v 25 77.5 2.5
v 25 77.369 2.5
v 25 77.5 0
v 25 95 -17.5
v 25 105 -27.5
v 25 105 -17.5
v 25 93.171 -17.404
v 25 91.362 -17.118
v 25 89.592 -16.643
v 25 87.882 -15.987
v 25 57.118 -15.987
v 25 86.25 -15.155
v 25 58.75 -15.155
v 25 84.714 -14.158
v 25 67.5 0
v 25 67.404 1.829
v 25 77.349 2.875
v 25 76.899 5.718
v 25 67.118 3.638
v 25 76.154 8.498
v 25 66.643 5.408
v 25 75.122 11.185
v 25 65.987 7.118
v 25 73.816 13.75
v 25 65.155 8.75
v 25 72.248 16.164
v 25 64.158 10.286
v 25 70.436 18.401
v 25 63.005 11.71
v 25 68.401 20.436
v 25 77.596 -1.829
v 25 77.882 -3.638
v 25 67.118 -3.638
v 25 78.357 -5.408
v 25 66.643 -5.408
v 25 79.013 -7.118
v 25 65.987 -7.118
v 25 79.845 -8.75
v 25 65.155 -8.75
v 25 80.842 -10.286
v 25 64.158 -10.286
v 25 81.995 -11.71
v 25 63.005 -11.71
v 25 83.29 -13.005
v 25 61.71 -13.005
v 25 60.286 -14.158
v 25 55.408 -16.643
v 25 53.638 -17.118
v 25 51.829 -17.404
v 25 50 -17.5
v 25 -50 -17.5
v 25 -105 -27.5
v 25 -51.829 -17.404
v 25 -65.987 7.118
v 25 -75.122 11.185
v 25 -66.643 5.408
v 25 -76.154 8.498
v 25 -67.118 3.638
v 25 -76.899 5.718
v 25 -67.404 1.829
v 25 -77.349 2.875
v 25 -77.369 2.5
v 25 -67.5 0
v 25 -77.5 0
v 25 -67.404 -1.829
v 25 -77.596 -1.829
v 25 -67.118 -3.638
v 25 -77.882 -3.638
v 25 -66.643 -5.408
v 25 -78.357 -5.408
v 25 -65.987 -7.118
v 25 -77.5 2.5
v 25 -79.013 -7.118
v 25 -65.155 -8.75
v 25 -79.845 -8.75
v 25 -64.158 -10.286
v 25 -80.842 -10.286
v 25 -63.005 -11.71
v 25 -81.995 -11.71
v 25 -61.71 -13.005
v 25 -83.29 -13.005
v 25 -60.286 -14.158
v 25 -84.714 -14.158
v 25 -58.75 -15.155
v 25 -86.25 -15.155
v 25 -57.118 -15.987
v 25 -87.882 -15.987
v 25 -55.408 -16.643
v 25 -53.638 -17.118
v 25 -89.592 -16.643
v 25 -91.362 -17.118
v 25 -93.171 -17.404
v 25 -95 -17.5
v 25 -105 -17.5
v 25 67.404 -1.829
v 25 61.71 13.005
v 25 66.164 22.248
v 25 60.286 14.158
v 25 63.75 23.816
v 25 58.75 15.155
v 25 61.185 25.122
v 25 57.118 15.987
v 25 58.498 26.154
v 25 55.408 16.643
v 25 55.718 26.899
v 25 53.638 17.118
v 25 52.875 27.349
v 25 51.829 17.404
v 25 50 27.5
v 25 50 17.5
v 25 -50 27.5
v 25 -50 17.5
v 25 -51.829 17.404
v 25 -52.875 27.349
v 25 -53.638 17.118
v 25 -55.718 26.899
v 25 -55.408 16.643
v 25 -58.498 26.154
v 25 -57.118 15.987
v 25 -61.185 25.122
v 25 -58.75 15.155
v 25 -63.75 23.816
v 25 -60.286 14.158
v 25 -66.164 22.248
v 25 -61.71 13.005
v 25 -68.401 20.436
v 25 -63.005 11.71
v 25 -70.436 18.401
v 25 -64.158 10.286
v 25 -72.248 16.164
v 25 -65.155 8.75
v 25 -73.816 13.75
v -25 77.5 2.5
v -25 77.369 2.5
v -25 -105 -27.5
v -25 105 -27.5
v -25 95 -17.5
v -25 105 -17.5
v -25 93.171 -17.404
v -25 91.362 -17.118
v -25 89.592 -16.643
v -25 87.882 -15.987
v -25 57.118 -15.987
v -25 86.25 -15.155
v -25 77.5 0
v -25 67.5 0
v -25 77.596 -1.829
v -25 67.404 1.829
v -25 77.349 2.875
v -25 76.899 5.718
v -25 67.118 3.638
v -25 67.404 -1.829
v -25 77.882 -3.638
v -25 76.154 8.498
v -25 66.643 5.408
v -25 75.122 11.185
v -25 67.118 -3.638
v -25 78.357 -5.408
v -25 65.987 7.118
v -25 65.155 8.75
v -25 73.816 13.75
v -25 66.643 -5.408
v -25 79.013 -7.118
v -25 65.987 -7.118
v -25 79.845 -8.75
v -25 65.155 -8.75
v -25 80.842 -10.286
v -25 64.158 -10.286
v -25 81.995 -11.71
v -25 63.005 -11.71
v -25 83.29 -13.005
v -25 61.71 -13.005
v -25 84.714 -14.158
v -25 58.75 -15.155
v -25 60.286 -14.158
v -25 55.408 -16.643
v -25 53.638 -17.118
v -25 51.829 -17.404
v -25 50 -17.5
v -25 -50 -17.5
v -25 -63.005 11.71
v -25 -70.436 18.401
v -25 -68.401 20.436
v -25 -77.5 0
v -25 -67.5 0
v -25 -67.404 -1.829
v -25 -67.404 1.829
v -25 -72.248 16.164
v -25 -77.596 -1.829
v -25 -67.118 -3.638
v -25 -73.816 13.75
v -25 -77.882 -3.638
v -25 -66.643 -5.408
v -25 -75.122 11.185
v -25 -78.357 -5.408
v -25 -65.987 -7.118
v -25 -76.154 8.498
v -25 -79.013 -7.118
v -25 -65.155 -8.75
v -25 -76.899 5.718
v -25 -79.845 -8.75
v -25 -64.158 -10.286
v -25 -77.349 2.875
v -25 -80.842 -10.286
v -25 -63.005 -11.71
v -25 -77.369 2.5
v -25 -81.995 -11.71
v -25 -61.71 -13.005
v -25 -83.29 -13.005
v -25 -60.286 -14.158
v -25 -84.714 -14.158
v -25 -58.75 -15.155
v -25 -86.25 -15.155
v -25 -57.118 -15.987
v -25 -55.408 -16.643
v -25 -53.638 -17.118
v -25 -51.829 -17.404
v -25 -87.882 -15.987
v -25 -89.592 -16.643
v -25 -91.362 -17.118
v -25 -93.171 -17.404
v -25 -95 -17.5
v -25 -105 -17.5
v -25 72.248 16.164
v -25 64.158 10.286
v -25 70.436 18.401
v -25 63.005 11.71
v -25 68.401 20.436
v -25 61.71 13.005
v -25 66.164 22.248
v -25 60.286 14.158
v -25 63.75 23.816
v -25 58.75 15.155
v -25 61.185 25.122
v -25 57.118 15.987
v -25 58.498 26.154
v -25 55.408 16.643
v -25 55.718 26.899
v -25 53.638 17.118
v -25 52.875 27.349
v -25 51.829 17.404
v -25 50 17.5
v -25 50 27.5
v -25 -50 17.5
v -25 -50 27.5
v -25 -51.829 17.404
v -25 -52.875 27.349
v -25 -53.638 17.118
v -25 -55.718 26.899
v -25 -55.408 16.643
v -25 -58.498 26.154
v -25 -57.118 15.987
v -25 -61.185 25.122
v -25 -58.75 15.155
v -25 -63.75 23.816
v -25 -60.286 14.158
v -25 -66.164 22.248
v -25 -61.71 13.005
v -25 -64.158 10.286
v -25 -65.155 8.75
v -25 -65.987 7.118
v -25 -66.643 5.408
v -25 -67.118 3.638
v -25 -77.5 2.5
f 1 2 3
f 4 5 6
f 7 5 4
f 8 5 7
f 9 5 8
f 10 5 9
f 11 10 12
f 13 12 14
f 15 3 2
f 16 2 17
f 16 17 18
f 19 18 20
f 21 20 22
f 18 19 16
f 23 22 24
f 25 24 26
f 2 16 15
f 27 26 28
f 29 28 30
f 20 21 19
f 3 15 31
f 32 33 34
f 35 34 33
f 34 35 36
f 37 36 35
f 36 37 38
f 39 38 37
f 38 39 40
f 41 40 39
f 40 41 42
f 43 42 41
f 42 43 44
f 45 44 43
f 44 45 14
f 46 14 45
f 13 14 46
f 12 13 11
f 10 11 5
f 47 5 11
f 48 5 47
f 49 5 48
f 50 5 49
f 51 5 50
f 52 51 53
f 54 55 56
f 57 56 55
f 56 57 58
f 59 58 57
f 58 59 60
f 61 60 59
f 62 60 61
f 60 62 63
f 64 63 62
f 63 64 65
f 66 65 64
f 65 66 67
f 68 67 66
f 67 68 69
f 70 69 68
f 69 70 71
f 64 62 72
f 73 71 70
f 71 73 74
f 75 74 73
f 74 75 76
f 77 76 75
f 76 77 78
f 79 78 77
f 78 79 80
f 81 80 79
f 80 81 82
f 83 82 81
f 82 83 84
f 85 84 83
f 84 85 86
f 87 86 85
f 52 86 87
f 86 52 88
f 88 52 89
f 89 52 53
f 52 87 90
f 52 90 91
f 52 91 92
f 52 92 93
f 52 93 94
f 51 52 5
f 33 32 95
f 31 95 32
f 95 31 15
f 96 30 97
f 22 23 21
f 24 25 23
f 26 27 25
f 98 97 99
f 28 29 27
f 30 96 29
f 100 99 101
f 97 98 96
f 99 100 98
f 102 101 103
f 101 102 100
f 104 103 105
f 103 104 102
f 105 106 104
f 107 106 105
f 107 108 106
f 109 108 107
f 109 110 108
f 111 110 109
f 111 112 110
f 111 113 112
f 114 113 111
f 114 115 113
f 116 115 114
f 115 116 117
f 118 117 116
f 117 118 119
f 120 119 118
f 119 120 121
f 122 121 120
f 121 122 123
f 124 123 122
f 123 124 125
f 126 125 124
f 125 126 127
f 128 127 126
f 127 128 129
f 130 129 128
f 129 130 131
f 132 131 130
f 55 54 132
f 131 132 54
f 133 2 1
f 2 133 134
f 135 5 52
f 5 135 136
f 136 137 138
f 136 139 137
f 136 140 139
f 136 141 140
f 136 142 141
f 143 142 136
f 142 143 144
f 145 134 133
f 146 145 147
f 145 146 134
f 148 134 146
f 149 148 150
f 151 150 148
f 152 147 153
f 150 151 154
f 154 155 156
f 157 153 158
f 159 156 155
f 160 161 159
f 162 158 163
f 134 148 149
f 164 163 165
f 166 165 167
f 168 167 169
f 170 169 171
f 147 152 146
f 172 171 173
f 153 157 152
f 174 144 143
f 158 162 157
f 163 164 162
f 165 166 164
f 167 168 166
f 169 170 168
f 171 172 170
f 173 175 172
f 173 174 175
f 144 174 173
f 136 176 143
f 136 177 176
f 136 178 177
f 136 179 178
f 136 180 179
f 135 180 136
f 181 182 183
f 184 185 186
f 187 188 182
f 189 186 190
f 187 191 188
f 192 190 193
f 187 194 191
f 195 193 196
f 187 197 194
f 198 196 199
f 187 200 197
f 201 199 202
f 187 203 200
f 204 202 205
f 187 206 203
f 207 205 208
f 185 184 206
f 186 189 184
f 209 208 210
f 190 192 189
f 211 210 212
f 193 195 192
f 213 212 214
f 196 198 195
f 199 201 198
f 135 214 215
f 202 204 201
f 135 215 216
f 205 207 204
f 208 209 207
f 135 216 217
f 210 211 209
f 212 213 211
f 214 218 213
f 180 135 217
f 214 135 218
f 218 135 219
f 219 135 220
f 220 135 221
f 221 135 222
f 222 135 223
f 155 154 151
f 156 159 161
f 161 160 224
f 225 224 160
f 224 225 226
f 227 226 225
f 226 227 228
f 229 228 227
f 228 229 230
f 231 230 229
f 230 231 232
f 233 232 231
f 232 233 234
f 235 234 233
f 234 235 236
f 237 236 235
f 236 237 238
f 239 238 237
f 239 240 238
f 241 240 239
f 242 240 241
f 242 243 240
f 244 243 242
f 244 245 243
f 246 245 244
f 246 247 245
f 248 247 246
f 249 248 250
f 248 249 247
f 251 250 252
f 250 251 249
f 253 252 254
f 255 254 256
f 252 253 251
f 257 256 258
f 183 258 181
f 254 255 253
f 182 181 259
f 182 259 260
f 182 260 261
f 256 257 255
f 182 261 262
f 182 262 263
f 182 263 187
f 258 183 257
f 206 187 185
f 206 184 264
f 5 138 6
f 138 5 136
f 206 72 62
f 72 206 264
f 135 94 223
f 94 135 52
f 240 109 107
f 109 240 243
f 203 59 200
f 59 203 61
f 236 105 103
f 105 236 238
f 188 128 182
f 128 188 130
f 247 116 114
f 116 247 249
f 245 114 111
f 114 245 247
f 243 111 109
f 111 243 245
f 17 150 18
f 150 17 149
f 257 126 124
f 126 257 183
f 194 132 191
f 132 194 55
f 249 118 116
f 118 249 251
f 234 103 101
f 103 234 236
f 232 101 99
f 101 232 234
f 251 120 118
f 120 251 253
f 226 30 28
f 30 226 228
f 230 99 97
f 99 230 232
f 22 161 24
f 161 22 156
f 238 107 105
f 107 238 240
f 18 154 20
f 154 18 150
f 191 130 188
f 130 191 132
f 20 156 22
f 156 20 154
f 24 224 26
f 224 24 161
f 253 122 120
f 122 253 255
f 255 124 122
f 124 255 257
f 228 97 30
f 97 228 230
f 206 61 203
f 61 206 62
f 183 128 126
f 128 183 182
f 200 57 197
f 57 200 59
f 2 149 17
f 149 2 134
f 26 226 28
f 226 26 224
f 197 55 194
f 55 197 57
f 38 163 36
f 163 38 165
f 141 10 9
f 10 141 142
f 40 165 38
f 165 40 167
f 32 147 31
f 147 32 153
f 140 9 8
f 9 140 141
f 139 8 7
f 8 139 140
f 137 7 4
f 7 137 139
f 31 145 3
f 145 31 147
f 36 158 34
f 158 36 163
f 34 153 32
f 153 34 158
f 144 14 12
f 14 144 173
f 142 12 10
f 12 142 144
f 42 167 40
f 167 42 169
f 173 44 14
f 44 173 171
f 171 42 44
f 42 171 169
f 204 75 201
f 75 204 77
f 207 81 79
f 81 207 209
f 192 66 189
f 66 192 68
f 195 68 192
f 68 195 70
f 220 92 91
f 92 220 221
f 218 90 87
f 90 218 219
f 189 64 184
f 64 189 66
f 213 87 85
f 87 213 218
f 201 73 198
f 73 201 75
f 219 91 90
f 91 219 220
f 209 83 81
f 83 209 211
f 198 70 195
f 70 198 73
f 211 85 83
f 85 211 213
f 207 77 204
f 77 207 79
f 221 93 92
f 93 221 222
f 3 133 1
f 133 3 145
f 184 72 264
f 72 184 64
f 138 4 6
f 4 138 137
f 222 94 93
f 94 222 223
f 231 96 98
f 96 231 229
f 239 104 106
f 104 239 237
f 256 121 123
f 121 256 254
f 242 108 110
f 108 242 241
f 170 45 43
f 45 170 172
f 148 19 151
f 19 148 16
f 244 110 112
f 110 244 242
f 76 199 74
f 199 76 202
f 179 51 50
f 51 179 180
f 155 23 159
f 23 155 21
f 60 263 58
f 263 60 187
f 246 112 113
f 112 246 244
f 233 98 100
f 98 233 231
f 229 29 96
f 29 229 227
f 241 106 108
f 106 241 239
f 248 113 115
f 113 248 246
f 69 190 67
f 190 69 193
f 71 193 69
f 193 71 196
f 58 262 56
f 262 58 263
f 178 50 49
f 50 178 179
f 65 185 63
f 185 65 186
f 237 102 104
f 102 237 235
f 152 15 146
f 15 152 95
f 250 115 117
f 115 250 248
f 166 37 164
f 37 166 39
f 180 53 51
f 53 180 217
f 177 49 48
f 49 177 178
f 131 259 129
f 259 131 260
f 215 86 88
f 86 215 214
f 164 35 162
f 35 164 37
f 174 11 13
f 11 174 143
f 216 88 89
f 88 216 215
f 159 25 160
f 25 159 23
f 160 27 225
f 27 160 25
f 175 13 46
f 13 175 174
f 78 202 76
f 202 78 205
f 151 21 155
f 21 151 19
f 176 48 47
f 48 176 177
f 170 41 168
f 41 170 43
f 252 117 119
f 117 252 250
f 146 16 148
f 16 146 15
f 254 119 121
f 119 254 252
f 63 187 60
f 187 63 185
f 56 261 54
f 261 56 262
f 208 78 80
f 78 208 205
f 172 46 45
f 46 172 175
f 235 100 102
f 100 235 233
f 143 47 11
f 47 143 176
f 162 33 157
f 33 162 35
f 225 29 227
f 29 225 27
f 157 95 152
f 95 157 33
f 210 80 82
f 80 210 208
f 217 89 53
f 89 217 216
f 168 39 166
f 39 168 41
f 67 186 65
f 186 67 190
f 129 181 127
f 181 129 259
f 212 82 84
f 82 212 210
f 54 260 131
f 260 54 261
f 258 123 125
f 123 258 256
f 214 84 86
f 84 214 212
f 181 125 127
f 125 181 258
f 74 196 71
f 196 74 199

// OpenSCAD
// file: Lib/fillet_cylinder.scad
module filleted_cylinder(
    cylinder_height=2,
    cylinder_radius=1,
    fillet_radius_bottom=1,
    fillet_radius_top=0,
    nfaces=50
) {
    /* created by Kevin Lam on Dec 3, 2016 */
    union() {      
        cylinder(cylinder_height, r=cylinder_radius, $fn=nfaces, false);
        
        if (fillet_radius_bottom > 0) {
            difference() {
                cylinder(fillet_radius_bottom, r=cylinder_radius+fillet_radius_bottom, $fn=nfaces, false);
                translate([0, 0, fillet_radius_bottom])
                rotate_extrude($fn=nfaces)
                translate([cylinder_radius+fillet_radius_bottom, 0, 0])
                circle(fillet_radius_bottom, $fn=nfaces);
            }
        }
        
        if (fillet_radius_top>0) {
            difference() {
                translate([0,0,cylinder_height-fillet_radius_top])
                cylinder(fillet_radius_top, r=cylinder_radius+fillet_radius_top, $fn=nfaces, false);
                
                translate([0, 0, cylinder_height-fillet_radius_top])
                rotate_extrude($fn=nfaces)
                translate([cylinder_radius+fillet_radius_top, 0, 0])
                circle(fillet_radius_top, $fn=nfaces);
            }
        }
    }
}
// file: Lib/prism.scad
   module prism(l, w, h){
   polyhedron(
           points=[[0,0,0], [l,0,0], [l,w,0], [0,w,0], [0,w,h], [l,w,h]],
           faces=[[0,1,2,3],[5,4,3,2],[0,4,5,1],[0,3,4],[5,2,1]]
           );

   }
   
// file: Lib/corner_radiuser.scad
module cornerRadiuser(radius=6){
    difference(){
        translate([radius/2,radius/2,0])
        cube([radius,radius,radius*2], center=true);
        cylinder(h=(radius*2)+2,r=radius, center=true);
    }
}
// file: Lib/steppers.scad
/**
 * Implementation of a model of a 28BYJ-48 type cheapo stepper motor
 */
use <mirrorcopy.scad>;
module stepper28BYJ48(){
    color("light grey"){
        translate([0,-8,0]){
            // Motor body
            translate([0,0,(19/2)*-1]){
                cylinder(d=28,h=19, center=true);
            }

            // Motor snooter
            translate([0,8,0]){
                translate([0,0,(1.5/2)])cylinder(d=9,h=1.5, center=true);
                difference(){
                    translate([0,0,(5/2)+2])cylinder(d=5,h=6, center=true);
                    mirrorCopy([0,1,0]){
                        translate([0,4,(5/2)+2.1])cube([5,5,6.2], center=true);
                    }
                }
            }
            
            // cable gland
            translate([0,(17/2)*-1,(19/2)*-1]){
                cube([14.8,17,19], center=true);
            }
            
            // Attachment crossbar
            difference(){
                hull(){
                    mirrorCopy([1,-0,0]){
                        translate([(35/2),0,(1/2)*-1]){
                            cylinder(h=1,d=7, center=true);
                        }
                    }
                }
                mirrorCopy([1,-0,0]){
                    translate([(35/2),0,(1/2)*-1]){
                        cylinder(h=1+0.01,d=4.2, center=true);
                    }
                }
            }
        }
    }
}


module stepper28BYJ48_cutouts(){
    color("orange"){
        translate([0,-8,0]){
            mirrorCopy([1,-0,0]){
                translate([(35/2),0,(1/2)*-1]){
                    cylinder(h=1+0.01,d=4.2, center=true);
                }
            }
        }
    }
}

module nemaCutout(shaftClearance, shaftGirth, shaftLength, frameSize, holeSpacing,holeDiameter=3,       nemaSlotSlackMM=0, shaft=false){
    translate([0,0,frameSize/-2]){
        hull(){
            mirrorCopy([0,1,0]){
                translate([0,nemaSlotSlackMM/2]){
                    cube([frameSize*1.01,frameSize*1.01,frameSize], center=true);
                }
            }
        }
    }
    if(!shaft){
        translate([0,0,10/2]){
            mirrorCopy([1,0,0]){
                mirrorCopy([0,1,0]){
                    translate([holeSpacing/2,holeSpacing/2,0]){
                        hull(){
                            mirrorCopy([0,1,0]){
                                translate([0,nemaSlotSlackMM/2,0]){
                                    cylinder(d=holeDiameter*1.1,h=30,center=true);
                                }
                            }
                        }
                    }
                }
            }
        }
    }
    
    if(!shaft){
        translate([0,0,-0.5]){
            cylinder(d=shaftClearance*1.03,h=shaftLength+1);
        }
    }else{
        difference(){
            cylinder(d=shaftGirth*1.03,h=shaftLength*2, $fn=360);
            translate([frameSize/-2,(shaftGirth/2)-(shaftGirth)*0.15,shaftLength*0.3+0.01]){
                cube([frameSize,frameSize/2,shaftLength*0.70]);
                translate([0,0,shaftLength*0.70-1])cube([frameSize,frameSize/2,shaftLength+1]);
            }
        }
    }
}

module nema14_cutout(){
    nemaCutout(22,5,24,35,26,3,2, shaft);
}

module nema17_cutout(shaft=false){
    
    nemaCutout(22,5,24,42.3,31,3,2, shaft);
}

nema17_cutout(true);
// file: Lib/metric_bolts.scad
capSizeMSizeMultiplier = 1.66*1.01;
printingKerfMM = 0.6;
circleFacets = 60;
boltColour = "LightSkyBlue";
boltClearanceColour = "LightSteelBlue";
boltClearanceTransparency = 0.3;

module metricBoltHex(mSize, structural=false, recessNut=0, chamfer=false){
    // Hex diameter = mSize * 1.8, (or 2.0 if structural
    // We add 1% to make the hex slip in better
    hexDiameter = (mSize * (structural?2.0:1.8) * 1.01) + printingKerfMM;

    color(boltColour)
    translate([0,0,(mSize*0.7)/2])
    cylinder(d=hexDiameter,h=mSize * 0.7, $fn=6, center=true);
    
    if(recessNut > 0){
        color(boltClearanceColour, boltClearanceTransparency)
        translate([0,0,(recessNut/2)*-1+0.1])
        cylinder(d=hexDiameter,h=recessNut+0.1, $fn=6, center=true);
    }
    if(chamfer){
        chamferHeight = mSize*1.5*0.595;
        color(boltClearanceColour, boltClearanceTransparency)
        translate([0,0,(mSize * 0.7)+(chamferHeight/2)])
        cylinder(d1=hexDiameter,d2=0,h=chamferHeight, center=true, $fn=6);
    }
}

module metricSocketCap(mSize, length, structural=false,recessCap=0, chamfer=false, overrideCapSize=0){
    //cap size = M number * 1.5.
    // We add 1% to make the cap head spin nicely in the hole.
    capSize = overrideCapSize > 0 ? overrideCapSize : (mSize * capSizeMSizeMultiplier) + printingKerfMM;
    
    color(boltColour)
        translate([0,0,(length + ((mSize*1.25)/2))])
            cylinder(d=capSize,h=mSize*1.25, center=true, $fn=circleFacets);
    //echo (str("cap size is ", capSize));
    if(recessCap > 0){
        color(boltClearanceColour, boltClearanceTransparency)
        translate([0,0,(length + ((recessCap/2)+(mSize*1.25)))])
        cylinder(d=capSize,h=recessCap, center=true, $fn=circleFacets);
    }
    if(chamfer){
        color(boltClearanceColour, boltClearanceTransparency)
        translate([0,0,(length-((mSize*1.5*0.595)/2))])
        cylinder(d2=capSize,d1=0,h=mSize*1.5*0.595, center=true, $fn=circleFacets);
    }
}

module metricShaft(mSize, length, structural=false){
    color(boltColour)
        translate([0,0,(length/2)])
            cylinder(d=mSize+printingKerfMM, h=length+0.01, center=true, $fn=circleFacets);
}

module metricSocketScrew(mSize, length, structural=false, recessCap=0, chamfer=false, overrideCapSize=0){
    metricSocketCap(mSize, length, structural=structural, recessCap=recessCap, chamfer=chamfer, overrideCapSize=overrideCapSize);
    metricShaft(mSize, length, structural=structural);
}

module metricCapheadAndBolt(mSize, length=40, structural=false, recessCap=0, recessNut=0, chamfer=false, overrideCapSize=0){
    capSize = overrideCapSize > 0 ? overrideCapSize : (mSize * capSizeMSizeMultiplier) + printingKerfMM;

    /*echo (str("Creating a M",mSize, " size, ", length, "mm long bolt with a ", capSize, "mm wide caphead and bolt ", chamfer?"with":"without", " chamfering."));
    if(recessCap){
        echo (str("It has a ", recessCap, "mm recessed cap"));
    }
    if(recessNut){
        echo (str("It has a ", recessCap, "mm recessed nut"));
    }/**/
    translate([0,0,((length/2)+((mSize*1.25)/2))*-1])
    union(){
        translate([0, 0, 0])
        metricSocketScrew(mSize, length, structural=structural, recessCap=recessCap, chamfer=chamfer, overrideCapSize=overrideCapSize);
        metricBoltHex(mSize,structural, recessNut=recessNut, chamfer=chamfer);
    }
}

/**/
translate([0,10,0])
metricCapheadAndBolt(6, 40);

translate([20,10,0])
metricCapheadAndBolt(6, 40, recessNut=1, recessCap=1, chamfer=true);
/**/
/*
translate([0,10,0])
metricCapheadAndBolt(6, 20, recessNut=10, recessCap=10);
/*
translate([0,20,0])
metricCapheadAndBolt(6, 20, chamfer=true);

translate([20,0,0])
metricCapheadAndBolt(10, 40);

translate([20,20,0])
metricCapheadAndBolt(10, 40, recessNut=10, recessCap=10);

translate([20,40,0])
metricCapheadAndBolt(10, 40, chamfer=true);
*/
// file: Lib/pcd.scad
module pcd(degrees){
    count=360/degrees;
    for(i=[1 : count]){
        rotate(degrees*i)
        children();
    }
}

module pcdAtFixedDegrees(degrees){
    for(degree=degrees){
        rotate(degree)
        children();
    }
}
// file: Lib/extrusion.scad
use <mirrorcopy.scad>
module doubleExtrusion(width,length, center=false){
    extraWallWidth = width*0.09;
    mirrorCopy([0,1,0]){
        color("orange")
        translate([0,(width - extraWallWidth)/2,length/2])
        cube([center?0:width/2,extraWallWidth,length], center=true);
    }
    
    translate([(width/2),0,0])
    children();
    translate([(width/2)*-1,0,0])
    children();
    color("grey",0.1)hull(){
        translate([(width/2),0,0])
        children();
        translate([(width/2)*-1,0,0])
        children();
    }
}

module extrusion_sub(length=10, outer=40, tSlot=8, gusset=4.5, bore=7, center=false){
    translate([0,0,center?0:length/2]){
        difference(){
            color("orange")
            union(){
                // Corners
                mirrorCopy([1,0,0]){
                    mirrorCopy([0,1,0]){
                        difference(){
                            union(){
                                translate([((outer-(outer-tSlot)/2)/2),(outer-(gusset))/2,0])
                                cube([(outer-tSlot)/2, (gusset),length], center=true);
                                mirror([-1,1,0])
                                translate([((outer-(outer-tSlot)/2)/2),(outer-(gusset))/2,0])
                                cube([(outer-tSlot)/2, (gusset),length], center=true);
                            }
                            difference(){
                                translate([((outer-(gusset))/2)+1,((outer-(gusset))/2)+1,0])
                                    cube([gusset*2,gusset*2,length+2], center=true);
                                translate([(outer-(gusset*2))/2,(outer-(gusset*2))/2,0])
                                    cylinder(d=gusset*2,h=length+4, center=true);
                            }
                        }
                    }
                }
                
                // Crossbar
                mirrorCopy(){
                    rotate(45)
                    cube([outer*1.3, gusset, length], center=true);
                }
                
                // Core
                cube([bore*2,bore*2,length], center=true);
            };
            
            union(){
                // Tappable Bore
                cylinder(d=bore, h=length+2, center=true);
            }
        }
    }
}
module extrusion(length=10, outer=40, tSlot=8, gusset=4.5, bore=7, center=false){
    color("grey",0.1)hull()extrusion_sub(length=length, outer=outer, tSlot=tSlot, gusset=gusset, bore=bore, center=center);
    extrusion_sub(length=length, outer=outer, tSlot=tSlot, gusset=gusset, bore=bore, center=center);
    echo(str("BOM: Extrusion(",outer,"mm) length=",length,"mm"));
}

module extrusion80x40(length, center=false){
    doubleExtrusion(40,length, center=center)
    extrusion40x40(length, center=center);
}
module extrusion60x30(length, center=false){
    doubleExtrusion(30,length, center=center)
    extrusion30x30(length, center=center);
}
module extrusion40x20(length, center=false){
    doubleExtrusion(20,length, center=center)
    extrusion20x20(length, center=center);
}

module extrusion20x20(length, center=false)
{
    extrusion(length=length, outer=20,tSlot=5, gusset=1.8, bore=4, center=center);
}

module extrusion30x30(length, center=false)
{
    extrusion(length=length, outer=30,tSlot=8, gusset=2.5, bore=7, center=center);
}

module extrusion40x40(length, center=false)
{
    extrusion(length=length, outer=40,tSlot=8, gusset=4.5, bore=7, center=center);
}
/**/
translate([-40,0,0])extrusion20x20(10, center=true);
translate([-60,30,0])extrusion30x30(10, center=true);
translate([-80,30+40,0])extrusion40x40(10, center=true);

translate([0,0,0])extrusion20x20(10);
translate([0,30,0])extrusion30x30(10);
translate([0,30+40,0])extrusion40x40(10);

translate([40,0,0])extrusion40x20(10);
translate([60,30,0])extrusion60x30(10);
translate([80,30+40,0])extrusion80x40(10);
/**/
// file: Lib/part_splitter.scad
module partSplitter(height=0,maxSize=200, spread=10, top=true, bottom=true){
    if($preview){
        children();
        translate([0,0,height])
            #cube([maxSize,maxSize,0.01], center=true);
    }else{
        if(top){
            color("red")
                translate([0,0,(spread/2)])
                    difference(){
                        children();
                        translate([0,0,((maxSize/2)*-1)+height])
                            cube([maxSize,maxSize,maxSize], center=true);
                    }
        }
        if(bottom){
            color("green")
                translate([0,0,(spread/2)*-1])
                    difference(){
                        children();
                        translate([0,0,(maxSize/2)+height])
                            cube([maxSize,maxSize,maxSize], center=true);
                    }
        }
    }
} 
// file: Lib/mirrorcopy.scad
module mirrorCopy(vec=[1,0,0]){
    children();
    mirror(vec) children();
} 
// file: Lib/bearings.scad
$useMcMaster = true;
module bearing(id, od, wd, mcmaster, series, labels=false){
    echo(str("Creating a ", series, " bearing with id=", id, "mm od=", od, "mm width=", wd, "mm ..."));
    difference(){
        color("grey")cylinder(d=od,h=wd, center=true);
        color("white")cylinder(d=id,h=wd+1, center=true);  
        if($preview && labels){
            bearing_lettering(id, od, wd, mcmaster, series);    
        }
    }
}

module bearing_lettering(id, od, wd, mcmaster, series)
{
    degreesSeries = 25*len(series);
    degreesMcMaster = 25*len(mcmaster);
    color("black")
    rotate(180+45){
        rotate(degreesSeries)
        bearing_text(id,od, wd, series,degreesSeries);
        if($useMcMaster){
            rotate(degreesMcMaster+degreesSeries+10)
            bearing_text(id,od, wd, mcmaster, degreesMcMaster);   
        }
    }
}

module bearing_text(id, od, wd, st, radiusConsumed=180){
    bearingGirth = (od-id)/2;
    letterHeight = bearingGirth * 0.6;
    letterOffsetFromCenter = (od/2) - (bearingGirth*0.9);
    
    width=bearingGirth ;
    thickness=wd/20 ;
    chars=len(st)+1 ;
    //echo(str("Writing ", st, " at " , letterOffsetFromCenter, "mm from center"));
    for (i = [1:chars]) {
            rotate([0,0,90-(i*(radiusConsumed/chars))])
            translate([0,letterOffsetFromCenter,(bearingGirth/2)-((thickness+1)/2)])
            linear_extrude(thickness+1)
            text(st[i-1],size=letterHeight, halign="center");
    }
}


module bearing_608(labels=true){ bearing(8,22,7,"5972K91","608", labels=labels); }
module bearing_629(labels=true){ bearing(9,26,8,"5972K93","629", labels=labels); }
module bearing_635(labels=true){ bearing(5,19,6,"5972K197","635", labels=labels); }
module bearing_6000(labels=true){ bearing(10,26,8,"5972K94","6000", labels=labels); }
module bearing_6001(labels=true){ bearing(12,28,8,"5972K95","6001", labels=labels); }
module bearing_6002(labels=true){ bearing(15,32,9,"5972K358","6002", labels=labels); }
module bearing_6003(labels=true){ bearing(17,35,10,"5972K311","6003", labels=labels); }
module bearing_6007(labels=true){ bearing(35,62,14,"5972K312","6007", labels=labels); }
module bearing_6200(labels=true){ bearing(10,30,9,"5972K101","6200", labels=labels); }
module bearing_6201(labels=true){ bearing(12,32,10,"5972K313","6201", labels=labels); }
module bearing_6202(labels=true){ bearing(15,35,11,"5972K314","6202", labels=labels); }
module bearing_6203(labels=true){ bearing(17,40,12,"5972K104","6203", labels=labels); }
module bearing_6204(labels=true){ bearing(20,47,14,"5972K105","6204", labels=labels); }
module bearing_6205(labels=true){ bearing(25,52,15,"5972K315","6205", labels=labels); }
module bearing_6206(labels=true){ bearing(30,62,16,"5972K316","6206", labels=labels); }
module bearing_6207(labels=true){ bearing(35,72,17,"5972K317","6207", labels=labels); }
module bearing_6208(labels=true){ bearing(40,80,18,"5972K114","6208", labels=labels); }
module bearing_6209(labels=true){ bearing(45,85,19,"5972K115","6209", labels=labels); }
module bearing_6210(labels=true){ bearing(50,90,20,"5972K129","6210", labels=labels); }
module bearing_6211(labels=true){ bearing(55,100,21,"5972K113","6211", labels=labels); }
module bearing_6212(labels=true){ bearing(60,110,22,"5972K3","6212", labels=labels); }
module bearing_6301(labels=true){ bearing(12,37,12,"5972K318","6301", labels=labels); }
module bearing_6302(labels=true){ bearing(15,42,13,"5972K117","6302", labels=labels); }
module bearing_6303(labels=true){ bearing(17,47,14,"5972K118","6303", labels=labels); }
module bearing_6304(labels=true){ bearing(20,52,15,"5972K119","6304", labels=labels); }
module bearing_6305(labels=true){ bearing(25,62,17,"5972K121","6305", labels=labels); }
module bearing_6306(labels=true){ bearing(30,72,19,"5972K319","6306", labels=labels); }
module bearing_6307(labels=true){ bearing(35,80,21,"5972K503","6307", labels=labels); }
module bearing_6308(labels=true){ bearing(40,90,23,"5972K124","6308", labels=labels); }
module bearing_6309(labels=true){ bearing(45,100,25,"5972K125","6309", labels=labels); }
module bearing_6310(labels=true){ bearing(50,110,27,"5972K126","6310", labels=labels); }
module bearing_6311(labels=true){ bearing(55,120,29,"5972K127","6311", labels=labels); }
module bearing_6312(labels=true){ bearing(60,130,31,"5972K128","6312", labels=labels); }
module bearing_6403(labels=true){ bearing(17,62,17,"5972K198","6403", labels=labels); }
module bearing_6800(labels=true){ bearing(10,19,5,"5972K211","6800", labels=labels); }
module bearing_6801(labels=true){ bearing(12,21,5,"5972K212","6801", labels=labels); }
module bearing_6802(labels=true){ bearing(15,24,5,"5972K213","6802", labels=labels); }
module bearing_6803(labels=true){ bearing(17,26,5,"5972K214","6803", labels=labels); }
module bearing_6804(labels=true){ bearing(20,32,7,"5972K215","6804", labels=labels); }
module bearing_6805(labels=true){ bearing(25,37,7,"5972K216","6805", labels=labels); }
module bearing_6806(labels=true){ bearing(30,42,7,"5972K217","6806", labels=labels); }
module bearing_6900(labels=true){ bearing(10,22,6,"5972K241","6900", labels=labels); }
module bearing_6901(labels=true){ bearing(12,24,6,"5972K242","6901", labels=labels); }
module bearing_6902(labels=true){ bearing(15,28,7,"5972K243","6902", labels=labels); }
module bearing_6903(labels=true){ bearing(17,30,7,"5972K244","6903", labels=labels); }
module bearing_6904(labels=true){ bearing(20,37,9,"5972K245","6904", labels=labels); }
module bearing_6905(labels=true){ bearing(25,42,9,"5972K246","6905", labels=labels); }
module bearing_6906(labels=true){ bearing(30,47,9,"5972K247","6906", labels=labels); }
module bearing_6907(labels=true){ bearing(35,55,10,"5972K248","6907", labels=labels); }
module bearing_6908(labels=true){ bearing(40,62,12,"5972K249","6908", labels=labels); }
module bearing_16002(labels=true){ bearing(15,32,8,"5972K199","16002", labels=labels); }
module bearing_16004(labels=true){ bearing(20,42,8,"5972K218","16004", labels=labels); }
module bearing_16005(labels=true){ bearing(25,47,8,"5972K219","16005", labels=labels); }
module bearing_16100(labels=true){ bearing(10,28,8,"5972K223","16100", labels=labels); }
module bearing_16101(labels=true){ bearing(12,30,8,"5972K224","16101", labels=labels); }

translate([0,0,0])
{   
    bearing_6800();
    bearing_6804();
    bearing_6907();
    translate([50,0,0])
    bearing_16101();
}


translate([0,60,0])
{   
    bearing_6800(labels=false);
    bearing_6804(labels=false);
    bearing_6907(labels=false);
    translate([50,0,0])
    bearing_16101(labels=false);
}
// file: Lib/mattlib.scad
include <../Lib/bearings.scad>;
include <../Lib/mirrorcopy.scad>;
include <../Lib/part_splitter.scad>;
include <../Lib/extrusion.scad>;
include <../Lib/pcd.scad>;
include <../Lib/metric_bolts.scad>;
include <../Lib/steppers.scad>;
include <../Lib/corner_radiuser.scad>;
include <../Lib/gears.scad>;
include <../Lib/prism.scad>;
include <../Lib/fillet_cylinder.scad>;
// main file
use <Lib/mattlib.scad>

module carry_handle_hole(){
    hull()mirrorCopy([0,1,0])translate([0,50,0])rotate([0,90,0])cylinder(h=55, d=35, center=true);
    mirrorCopy([0,1,0])translate([0,95,0])rotate([0,90,0])cylinder(h=55, d=35, center=true);
    mirrorCopy([0,1,0])translate([0,95,10])rotate([0,90,0])cube([20,35,55], center=true);
    mirrorCopy([0,1,0])translate([0,120,10])rotate([0,90,0])cube([55,50,55], center=true);
}
module carry_handle_plastic(){
    
    mirrorCopy([0,1,0])translate([0,75,-12.5])cube([50,60,30], center=true);
    hull()mirrorCopy([0,1,0])translate([0,50,0])rotate([0,90,0])cylinder(h=50, d=55, center=true);
}

module carry_handle(){
    difference(){
        carry_handle_plastic();
        carry_handle_hole();
    }
}
carry_handle();
